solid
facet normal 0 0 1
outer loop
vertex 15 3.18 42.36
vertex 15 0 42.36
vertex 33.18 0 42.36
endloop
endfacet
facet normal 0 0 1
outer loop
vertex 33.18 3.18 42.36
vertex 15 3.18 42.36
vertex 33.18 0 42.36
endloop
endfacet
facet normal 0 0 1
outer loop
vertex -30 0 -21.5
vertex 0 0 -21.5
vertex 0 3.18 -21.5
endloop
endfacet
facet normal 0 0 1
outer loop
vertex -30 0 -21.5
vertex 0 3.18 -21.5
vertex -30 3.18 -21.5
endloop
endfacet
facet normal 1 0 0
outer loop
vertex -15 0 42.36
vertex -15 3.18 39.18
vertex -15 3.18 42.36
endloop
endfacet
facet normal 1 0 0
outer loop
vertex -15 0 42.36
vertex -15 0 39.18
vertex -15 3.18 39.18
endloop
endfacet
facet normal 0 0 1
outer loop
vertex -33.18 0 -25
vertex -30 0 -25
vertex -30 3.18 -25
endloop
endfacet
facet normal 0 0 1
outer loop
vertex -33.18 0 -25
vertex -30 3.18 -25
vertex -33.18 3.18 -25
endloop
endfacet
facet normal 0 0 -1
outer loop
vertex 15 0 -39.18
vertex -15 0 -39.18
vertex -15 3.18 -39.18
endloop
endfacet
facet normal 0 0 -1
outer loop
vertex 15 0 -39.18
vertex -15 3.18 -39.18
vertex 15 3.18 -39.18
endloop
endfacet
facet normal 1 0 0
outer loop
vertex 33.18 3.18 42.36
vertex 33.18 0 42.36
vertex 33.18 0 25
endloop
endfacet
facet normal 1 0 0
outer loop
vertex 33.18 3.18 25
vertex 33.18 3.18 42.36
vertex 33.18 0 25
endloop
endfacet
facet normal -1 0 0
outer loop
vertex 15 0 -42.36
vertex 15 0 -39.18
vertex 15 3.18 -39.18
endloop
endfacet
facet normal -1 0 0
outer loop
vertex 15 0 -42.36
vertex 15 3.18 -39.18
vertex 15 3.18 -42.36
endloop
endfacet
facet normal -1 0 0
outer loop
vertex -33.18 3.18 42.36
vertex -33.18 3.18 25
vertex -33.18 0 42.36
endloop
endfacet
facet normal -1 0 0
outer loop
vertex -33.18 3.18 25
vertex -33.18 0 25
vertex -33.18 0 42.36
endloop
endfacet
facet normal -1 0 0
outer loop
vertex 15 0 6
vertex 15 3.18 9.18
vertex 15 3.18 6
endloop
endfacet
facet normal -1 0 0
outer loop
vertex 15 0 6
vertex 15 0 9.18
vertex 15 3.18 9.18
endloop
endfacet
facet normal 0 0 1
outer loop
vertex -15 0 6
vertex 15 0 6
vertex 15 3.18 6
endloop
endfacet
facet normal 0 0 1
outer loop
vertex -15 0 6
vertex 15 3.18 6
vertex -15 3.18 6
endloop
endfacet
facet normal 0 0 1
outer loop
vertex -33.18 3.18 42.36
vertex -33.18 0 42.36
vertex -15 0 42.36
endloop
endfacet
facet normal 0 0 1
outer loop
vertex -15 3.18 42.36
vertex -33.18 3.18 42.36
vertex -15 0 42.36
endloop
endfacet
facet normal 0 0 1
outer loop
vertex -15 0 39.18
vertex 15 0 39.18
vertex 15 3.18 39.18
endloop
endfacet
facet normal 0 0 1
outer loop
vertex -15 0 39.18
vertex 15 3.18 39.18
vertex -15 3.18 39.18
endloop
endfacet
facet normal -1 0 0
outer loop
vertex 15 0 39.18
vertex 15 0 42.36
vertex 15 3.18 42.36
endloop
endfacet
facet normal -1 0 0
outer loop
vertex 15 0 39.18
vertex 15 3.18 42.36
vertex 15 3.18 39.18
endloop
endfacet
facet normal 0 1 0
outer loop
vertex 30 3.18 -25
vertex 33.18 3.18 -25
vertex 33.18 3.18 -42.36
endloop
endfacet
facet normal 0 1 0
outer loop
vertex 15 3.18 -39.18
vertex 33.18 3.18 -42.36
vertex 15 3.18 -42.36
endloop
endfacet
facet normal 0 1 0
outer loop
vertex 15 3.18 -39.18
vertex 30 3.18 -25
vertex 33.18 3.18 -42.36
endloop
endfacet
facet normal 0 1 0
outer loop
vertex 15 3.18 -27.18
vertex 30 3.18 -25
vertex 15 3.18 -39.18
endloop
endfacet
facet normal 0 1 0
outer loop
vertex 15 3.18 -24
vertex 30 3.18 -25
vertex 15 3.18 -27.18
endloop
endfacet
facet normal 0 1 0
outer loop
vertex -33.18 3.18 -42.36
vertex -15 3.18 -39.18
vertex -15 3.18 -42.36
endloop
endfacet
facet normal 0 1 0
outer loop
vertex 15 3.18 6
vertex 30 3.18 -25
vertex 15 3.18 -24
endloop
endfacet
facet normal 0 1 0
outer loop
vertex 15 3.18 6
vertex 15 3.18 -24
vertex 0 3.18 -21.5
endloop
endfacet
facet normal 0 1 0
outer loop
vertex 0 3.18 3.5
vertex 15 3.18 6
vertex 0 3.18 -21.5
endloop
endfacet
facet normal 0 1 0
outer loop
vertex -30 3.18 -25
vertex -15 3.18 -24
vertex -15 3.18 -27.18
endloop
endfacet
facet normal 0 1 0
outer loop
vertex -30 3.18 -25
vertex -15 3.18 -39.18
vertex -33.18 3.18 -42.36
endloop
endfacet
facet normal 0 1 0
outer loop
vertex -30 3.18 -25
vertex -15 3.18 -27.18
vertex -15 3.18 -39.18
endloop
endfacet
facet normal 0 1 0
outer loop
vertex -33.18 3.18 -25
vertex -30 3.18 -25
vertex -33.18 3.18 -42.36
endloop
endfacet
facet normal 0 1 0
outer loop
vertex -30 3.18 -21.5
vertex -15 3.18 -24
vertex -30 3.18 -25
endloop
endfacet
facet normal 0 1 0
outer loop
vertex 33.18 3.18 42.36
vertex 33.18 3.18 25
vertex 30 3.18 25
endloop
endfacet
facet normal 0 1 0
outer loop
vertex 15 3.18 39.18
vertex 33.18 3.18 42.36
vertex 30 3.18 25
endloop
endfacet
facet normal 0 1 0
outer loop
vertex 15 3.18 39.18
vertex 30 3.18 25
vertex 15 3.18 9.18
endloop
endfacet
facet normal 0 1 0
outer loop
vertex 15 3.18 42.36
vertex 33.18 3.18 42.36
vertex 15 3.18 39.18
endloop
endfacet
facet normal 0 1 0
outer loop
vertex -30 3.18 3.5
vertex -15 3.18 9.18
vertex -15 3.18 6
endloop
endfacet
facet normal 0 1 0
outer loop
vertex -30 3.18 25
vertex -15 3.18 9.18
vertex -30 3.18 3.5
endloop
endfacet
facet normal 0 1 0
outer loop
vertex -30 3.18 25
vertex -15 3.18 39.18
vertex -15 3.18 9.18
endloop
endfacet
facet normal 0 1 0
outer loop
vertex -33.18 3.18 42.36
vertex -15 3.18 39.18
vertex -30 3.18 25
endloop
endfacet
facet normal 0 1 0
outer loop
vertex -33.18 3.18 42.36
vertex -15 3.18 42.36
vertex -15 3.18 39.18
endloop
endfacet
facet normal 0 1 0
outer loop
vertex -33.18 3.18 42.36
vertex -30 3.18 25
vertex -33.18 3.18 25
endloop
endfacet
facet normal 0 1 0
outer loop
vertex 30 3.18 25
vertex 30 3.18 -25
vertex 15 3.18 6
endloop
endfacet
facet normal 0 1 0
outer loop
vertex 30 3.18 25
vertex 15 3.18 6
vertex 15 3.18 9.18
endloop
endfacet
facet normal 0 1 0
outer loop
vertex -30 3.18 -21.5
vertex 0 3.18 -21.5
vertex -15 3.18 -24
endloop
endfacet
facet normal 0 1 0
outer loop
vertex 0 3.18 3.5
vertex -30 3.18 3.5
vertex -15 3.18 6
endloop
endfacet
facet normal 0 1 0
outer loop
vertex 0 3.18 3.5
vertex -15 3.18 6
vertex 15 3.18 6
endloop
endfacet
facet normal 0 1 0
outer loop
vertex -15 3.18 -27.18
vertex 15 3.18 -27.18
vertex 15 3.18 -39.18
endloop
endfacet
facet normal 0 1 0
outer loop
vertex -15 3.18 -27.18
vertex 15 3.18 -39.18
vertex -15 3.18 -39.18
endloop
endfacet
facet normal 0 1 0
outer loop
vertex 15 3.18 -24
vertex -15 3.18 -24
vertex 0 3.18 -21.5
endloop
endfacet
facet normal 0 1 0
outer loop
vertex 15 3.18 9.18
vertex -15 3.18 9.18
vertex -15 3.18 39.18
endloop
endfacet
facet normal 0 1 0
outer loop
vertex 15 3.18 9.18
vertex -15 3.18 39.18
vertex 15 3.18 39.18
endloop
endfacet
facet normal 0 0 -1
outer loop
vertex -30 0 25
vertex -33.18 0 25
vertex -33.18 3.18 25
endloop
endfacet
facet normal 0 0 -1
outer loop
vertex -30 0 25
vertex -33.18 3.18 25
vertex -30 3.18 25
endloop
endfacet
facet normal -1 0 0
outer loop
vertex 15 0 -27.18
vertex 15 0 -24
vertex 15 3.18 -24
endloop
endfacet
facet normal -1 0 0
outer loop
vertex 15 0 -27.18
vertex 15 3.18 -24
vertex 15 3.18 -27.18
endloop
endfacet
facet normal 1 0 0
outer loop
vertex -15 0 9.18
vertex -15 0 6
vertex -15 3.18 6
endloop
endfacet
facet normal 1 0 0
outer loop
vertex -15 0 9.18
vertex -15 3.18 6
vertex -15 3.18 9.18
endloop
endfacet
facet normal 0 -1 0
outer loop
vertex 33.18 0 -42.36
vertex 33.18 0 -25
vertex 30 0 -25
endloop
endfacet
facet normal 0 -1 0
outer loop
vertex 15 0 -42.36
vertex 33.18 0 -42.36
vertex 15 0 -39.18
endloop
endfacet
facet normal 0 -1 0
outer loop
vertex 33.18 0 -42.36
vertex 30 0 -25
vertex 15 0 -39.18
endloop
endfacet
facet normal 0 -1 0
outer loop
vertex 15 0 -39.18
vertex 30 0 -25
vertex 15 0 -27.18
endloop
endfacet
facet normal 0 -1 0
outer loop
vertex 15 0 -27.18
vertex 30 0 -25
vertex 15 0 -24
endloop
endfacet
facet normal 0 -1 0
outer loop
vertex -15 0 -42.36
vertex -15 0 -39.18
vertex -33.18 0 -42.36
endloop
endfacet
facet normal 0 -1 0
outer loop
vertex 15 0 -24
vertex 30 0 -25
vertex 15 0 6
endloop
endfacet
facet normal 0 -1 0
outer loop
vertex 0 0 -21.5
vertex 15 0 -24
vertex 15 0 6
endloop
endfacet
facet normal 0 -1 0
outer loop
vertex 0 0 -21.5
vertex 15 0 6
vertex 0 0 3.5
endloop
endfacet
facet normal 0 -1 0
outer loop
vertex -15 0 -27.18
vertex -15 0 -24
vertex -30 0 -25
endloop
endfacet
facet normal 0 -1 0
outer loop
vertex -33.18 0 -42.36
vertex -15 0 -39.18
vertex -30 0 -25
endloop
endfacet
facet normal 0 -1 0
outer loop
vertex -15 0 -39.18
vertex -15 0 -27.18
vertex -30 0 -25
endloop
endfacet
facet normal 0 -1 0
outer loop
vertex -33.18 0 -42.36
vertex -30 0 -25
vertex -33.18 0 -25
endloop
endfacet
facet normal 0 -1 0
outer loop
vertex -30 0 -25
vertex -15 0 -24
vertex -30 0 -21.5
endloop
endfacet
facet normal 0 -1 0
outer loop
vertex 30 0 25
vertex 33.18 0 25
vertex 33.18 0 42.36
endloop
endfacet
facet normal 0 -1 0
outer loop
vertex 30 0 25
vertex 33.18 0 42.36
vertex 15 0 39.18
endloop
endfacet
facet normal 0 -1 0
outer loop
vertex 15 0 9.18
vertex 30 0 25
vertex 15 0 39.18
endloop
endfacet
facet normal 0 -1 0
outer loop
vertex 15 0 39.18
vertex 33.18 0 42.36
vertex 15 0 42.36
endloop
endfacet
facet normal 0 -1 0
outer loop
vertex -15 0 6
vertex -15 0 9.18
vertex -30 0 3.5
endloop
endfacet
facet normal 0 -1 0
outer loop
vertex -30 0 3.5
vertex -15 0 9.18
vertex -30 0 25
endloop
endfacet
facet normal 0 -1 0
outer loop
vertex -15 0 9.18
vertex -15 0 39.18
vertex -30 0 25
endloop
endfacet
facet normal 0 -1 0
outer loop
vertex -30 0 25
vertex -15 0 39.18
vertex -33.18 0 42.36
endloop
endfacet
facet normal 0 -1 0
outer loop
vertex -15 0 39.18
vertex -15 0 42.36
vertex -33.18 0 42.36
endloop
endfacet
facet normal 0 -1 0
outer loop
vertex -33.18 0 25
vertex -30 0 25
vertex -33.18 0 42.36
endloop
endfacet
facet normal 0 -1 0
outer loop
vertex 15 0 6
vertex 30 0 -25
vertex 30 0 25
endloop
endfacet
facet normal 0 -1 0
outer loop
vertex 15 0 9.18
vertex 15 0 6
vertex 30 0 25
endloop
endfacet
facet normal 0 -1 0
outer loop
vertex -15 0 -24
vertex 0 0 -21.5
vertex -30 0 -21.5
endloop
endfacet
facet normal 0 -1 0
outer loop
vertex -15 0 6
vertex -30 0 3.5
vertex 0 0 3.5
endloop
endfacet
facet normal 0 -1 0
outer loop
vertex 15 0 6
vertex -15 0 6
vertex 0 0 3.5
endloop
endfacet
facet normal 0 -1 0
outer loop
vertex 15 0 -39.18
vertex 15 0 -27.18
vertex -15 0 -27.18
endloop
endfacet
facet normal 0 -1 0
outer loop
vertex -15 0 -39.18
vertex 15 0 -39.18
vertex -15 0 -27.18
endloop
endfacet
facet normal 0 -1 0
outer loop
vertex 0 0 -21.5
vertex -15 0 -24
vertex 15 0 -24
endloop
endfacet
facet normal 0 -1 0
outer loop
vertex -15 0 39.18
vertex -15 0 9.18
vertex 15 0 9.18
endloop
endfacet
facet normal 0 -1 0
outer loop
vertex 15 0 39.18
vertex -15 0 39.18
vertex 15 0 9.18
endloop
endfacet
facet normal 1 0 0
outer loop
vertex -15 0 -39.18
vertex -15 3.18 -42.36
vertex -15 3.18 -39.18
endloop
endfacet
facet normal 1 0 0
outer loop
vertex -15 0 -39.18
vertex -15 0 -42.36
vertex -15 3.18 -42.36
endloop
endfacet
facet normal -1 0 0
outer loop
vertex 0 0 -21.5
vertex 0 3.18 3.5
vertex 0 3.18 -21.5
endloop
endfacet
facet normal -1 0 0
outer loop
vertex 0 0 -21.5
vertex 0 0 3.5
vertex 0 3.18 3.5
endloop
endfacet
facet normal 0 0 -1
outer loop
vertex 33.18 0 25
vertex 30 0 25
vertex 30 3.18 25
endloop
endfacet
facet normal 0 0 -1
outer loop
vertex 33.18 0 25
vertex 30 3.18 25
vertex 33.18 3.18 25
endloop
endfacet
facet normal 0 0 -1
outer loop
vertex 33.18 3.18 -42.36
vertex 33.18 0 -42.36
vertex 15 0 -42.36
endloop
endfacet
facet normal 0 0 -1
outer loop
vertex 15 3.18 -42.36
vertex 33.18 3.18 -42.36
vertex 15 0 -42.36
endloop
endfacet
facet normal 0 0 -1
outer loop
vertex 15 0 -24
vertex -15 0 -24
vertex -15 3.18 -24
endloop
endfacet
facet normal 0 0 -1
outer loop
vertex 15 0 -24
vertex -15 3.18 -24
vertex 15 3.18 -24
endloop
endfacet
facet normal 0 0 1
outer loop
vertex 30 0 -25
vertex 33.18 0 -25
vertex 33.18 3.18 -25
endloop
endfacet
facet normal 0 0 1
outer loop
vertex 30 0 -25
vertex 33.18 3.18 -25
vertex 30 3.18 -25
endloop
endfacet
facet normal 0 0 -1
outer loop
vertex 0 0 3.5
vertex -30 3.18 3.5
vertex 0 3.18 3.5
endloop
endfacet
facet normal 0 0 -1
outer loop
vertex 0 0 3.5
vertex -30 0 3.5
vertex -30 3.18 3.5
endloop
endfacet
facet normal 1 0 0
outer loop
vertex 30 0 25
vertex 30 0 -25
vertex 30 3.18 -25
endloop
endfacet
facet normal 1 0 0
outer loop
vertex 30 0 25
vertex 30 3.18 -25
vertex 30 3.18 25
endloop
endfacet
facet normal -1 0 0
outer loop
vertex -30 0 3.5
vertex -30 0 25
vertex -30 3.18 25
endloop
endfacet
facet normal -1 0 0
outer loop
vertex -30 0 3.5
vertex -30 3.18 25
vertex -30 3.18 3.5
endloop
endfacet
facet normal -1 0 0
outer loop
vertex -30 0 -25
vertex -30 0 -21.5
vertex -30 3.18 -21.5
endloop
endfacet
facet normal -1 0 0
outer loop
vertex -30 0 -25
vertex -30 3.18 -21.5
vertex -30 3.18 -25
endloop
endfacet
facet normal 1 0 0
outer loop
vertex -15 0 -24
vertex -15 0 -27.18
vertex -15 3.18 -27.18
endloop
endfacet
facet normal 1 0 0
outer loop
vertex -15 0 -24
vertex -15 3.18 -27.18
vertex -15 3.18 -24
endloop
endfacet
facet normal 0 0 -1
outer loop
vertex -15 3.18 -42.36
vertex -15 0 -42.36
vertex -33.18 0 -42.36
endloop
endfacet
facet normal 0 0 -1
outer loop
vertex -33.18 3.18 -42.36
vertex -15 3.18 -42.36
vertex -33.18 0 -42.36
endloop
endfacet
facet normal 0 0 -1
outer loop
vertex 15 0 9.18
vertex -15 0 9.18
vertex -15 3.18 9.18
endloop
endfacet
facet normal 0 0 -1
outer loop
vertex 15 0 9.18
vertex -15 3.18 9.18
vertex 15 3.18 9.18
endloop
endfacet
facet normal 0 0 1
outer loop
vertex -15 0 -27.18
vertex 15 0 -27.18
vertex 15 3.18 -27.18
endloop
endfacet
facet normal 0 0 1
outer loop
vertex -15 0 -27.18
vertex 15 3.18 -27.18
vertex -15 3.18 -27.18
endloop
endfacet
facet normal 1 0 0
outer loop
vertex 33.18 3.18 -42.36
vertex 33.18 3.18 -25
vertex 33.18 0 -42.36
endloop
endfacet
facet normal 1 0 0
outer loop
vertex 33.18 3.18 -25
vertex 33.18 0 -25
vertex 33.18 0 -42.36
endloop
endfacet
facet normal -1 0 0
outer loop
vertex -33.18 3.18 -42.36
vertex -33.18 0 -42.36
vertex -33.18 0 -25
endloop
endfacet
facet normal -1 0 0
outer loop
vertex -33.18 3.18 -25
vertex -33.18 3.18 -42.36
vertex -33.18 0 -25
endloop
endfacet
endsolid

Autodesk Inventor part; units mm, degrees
ref_plane "YZ Plane" through (0, 0, 0) normal (1, 0, 0) x (0, 1, 0)
ref_plane "XZ Plane" through (0, 0, 0) normal (0, 1, 0) x (-1, 0, 0)
ref_plane "XY Plane" through (0, 0, 0) normal (0, 0, 1) x (1, 0, 0)
sketch "Boceto2" plane through (0, 0, 0) normal (0, 1, 0) x (-1, 0, 0)
  line L0 (33.18, 42.36) -> (-33.18, 42.36)
  line L1 (-33.18, 42.36) -> (-33.18, -42.36)
  line L2 (-33.18, -42.36) -> (33.18, -42.36)
  line L3 (33.18, -42.36) -> (33.18, 42.36)
  line L4 (33.18, 42.36) -> (-33.18, -42.36) construction
  line L5 (-33.18, 42.36) -> (33.18, -42.36) construction
  line L6 (15, 42.36) -> (-15, 42.36)
  line L7 (-15, 42.36) -> (-15, 39.18)
  line L8 (-15, 39.18) -> (15, 39.18)
  line L9 (15, 39.18) -> (15, 42.36)
  line L10 (15, 42.36) -> (-15, 39.18) construction
  line L11 (-15, 42.36) -> (15, 39.18) construction
  line L12 (15, 9.18) -> (-15, 9.18)
  line L13 (-15, 9.18) -> (-15, 6)
  line L14 (-15, 6) -> (15, 6)
  line L15 (15, 6) -> (15, 9.18)
  line L16 (15, 9.18) -> (-15, 6) construction
  line L17 (-15, 9.18) -> (15, 6) construction
  line L18 (15, -24) -> (-15, -24)
  line L19 (-15, -24) -> (-15, -27.18)
  line L20 (-15, -27.18) -> (15, -27.18)
  line L21 (15, -27.18) -> (15, -24)
  line L22 (15, -24) -> (-15, -27.18) construction
  line L23 (-15, -24) -> (15, -27.18) construction
  line L24 (15, -39.18) -> (-15, -39.18)
  line L25 (-15, -39.18) -> (-15, -42.36)
  line L26 (-15, -42.36) -> (15, -42.36)
  line L27 (15, -42.36) -> (15, -39.18)
  line L28 (15, -39.18) -> (-15, -42.36) construction
  line L29 (-15, -39.18) -> (15, -42.36) construction
  line L30 (-30, 25) -> (-33.18, 25)
  line L31 (-33.18, 25) -> (-33.18, -25)
  line L32 (-33.18, -25) -> (-30, -25)
  line L33 (-30, -25) -> (-30, 25)
  line L34 (-30, 25) -> (-33.18, -25) construction
  line L35 (-33.18, 25) -> (-30, -25) construction
  line L36 (33.18, 25) -> (30, 25)
  line L37 (30, 25) -> (30, -25)
  line L38 (30, -25) -> (33.18, -25)
  line L39 (33.18, -25) -> (33.18, 25)
  line L40 (33.18, 25) -> (30, -25) construction
  line L41 (30, 25) -> (33.18, -25) construction
  line L42 (30, 3.5) -> (0, 3.5)
  line L43 (0, 3.5) -> (0, -21.5)
  line L44 (0, -21.5) -> (30, -21.5)
  line L45 (30, -21.5) -> (30, 3.5)
  line L46 (30, 3.5) -> (0, -21.5) construction
  line L47 (0, 3.5) -> (30, -21.5) construction
  point P0 (0, 0)
  point P1 (0, 40.77)
  point P2 (0, 7.59)
  point P3 (0, -25.59)
  point P4 (0, -40.77)
  point P5 (-31.59, 0)
  point P6 (31.59, 0)
  point P7 (15, -9)
  dimension "d37" = 84.72
  dimension "d38" = 66.36
  dimension "d39" = 30
  dimension "d40" = 3.18
  dimension "d41" = 0
  dimension "d42" = 3.18
  dimension "d43" = 30
  dimension "d44" = 30
  dimension "d45" = 3.18
  dimension "d46" = 30
  dimension "d47" = 30
  dimension "d48" = 12
  dimension "d49" = 50
  dimension "d50" = 0
  dimension "d51" = 0
  dimension "d52" = 50
  dimension "d53" = 15
  dimension "d54" = 25
  dimension "d59" = 30
extrude "Extrusión2" add sketch "Boceto2" along normal blind 3.18 contours L3 L36 L37 L42 L43 L44 L38 L2 L27 L24 L25 L1 L32 L33 L30 L0 L7 L8 L9
properties part number "HOMBRO_TAPA.LAT"
